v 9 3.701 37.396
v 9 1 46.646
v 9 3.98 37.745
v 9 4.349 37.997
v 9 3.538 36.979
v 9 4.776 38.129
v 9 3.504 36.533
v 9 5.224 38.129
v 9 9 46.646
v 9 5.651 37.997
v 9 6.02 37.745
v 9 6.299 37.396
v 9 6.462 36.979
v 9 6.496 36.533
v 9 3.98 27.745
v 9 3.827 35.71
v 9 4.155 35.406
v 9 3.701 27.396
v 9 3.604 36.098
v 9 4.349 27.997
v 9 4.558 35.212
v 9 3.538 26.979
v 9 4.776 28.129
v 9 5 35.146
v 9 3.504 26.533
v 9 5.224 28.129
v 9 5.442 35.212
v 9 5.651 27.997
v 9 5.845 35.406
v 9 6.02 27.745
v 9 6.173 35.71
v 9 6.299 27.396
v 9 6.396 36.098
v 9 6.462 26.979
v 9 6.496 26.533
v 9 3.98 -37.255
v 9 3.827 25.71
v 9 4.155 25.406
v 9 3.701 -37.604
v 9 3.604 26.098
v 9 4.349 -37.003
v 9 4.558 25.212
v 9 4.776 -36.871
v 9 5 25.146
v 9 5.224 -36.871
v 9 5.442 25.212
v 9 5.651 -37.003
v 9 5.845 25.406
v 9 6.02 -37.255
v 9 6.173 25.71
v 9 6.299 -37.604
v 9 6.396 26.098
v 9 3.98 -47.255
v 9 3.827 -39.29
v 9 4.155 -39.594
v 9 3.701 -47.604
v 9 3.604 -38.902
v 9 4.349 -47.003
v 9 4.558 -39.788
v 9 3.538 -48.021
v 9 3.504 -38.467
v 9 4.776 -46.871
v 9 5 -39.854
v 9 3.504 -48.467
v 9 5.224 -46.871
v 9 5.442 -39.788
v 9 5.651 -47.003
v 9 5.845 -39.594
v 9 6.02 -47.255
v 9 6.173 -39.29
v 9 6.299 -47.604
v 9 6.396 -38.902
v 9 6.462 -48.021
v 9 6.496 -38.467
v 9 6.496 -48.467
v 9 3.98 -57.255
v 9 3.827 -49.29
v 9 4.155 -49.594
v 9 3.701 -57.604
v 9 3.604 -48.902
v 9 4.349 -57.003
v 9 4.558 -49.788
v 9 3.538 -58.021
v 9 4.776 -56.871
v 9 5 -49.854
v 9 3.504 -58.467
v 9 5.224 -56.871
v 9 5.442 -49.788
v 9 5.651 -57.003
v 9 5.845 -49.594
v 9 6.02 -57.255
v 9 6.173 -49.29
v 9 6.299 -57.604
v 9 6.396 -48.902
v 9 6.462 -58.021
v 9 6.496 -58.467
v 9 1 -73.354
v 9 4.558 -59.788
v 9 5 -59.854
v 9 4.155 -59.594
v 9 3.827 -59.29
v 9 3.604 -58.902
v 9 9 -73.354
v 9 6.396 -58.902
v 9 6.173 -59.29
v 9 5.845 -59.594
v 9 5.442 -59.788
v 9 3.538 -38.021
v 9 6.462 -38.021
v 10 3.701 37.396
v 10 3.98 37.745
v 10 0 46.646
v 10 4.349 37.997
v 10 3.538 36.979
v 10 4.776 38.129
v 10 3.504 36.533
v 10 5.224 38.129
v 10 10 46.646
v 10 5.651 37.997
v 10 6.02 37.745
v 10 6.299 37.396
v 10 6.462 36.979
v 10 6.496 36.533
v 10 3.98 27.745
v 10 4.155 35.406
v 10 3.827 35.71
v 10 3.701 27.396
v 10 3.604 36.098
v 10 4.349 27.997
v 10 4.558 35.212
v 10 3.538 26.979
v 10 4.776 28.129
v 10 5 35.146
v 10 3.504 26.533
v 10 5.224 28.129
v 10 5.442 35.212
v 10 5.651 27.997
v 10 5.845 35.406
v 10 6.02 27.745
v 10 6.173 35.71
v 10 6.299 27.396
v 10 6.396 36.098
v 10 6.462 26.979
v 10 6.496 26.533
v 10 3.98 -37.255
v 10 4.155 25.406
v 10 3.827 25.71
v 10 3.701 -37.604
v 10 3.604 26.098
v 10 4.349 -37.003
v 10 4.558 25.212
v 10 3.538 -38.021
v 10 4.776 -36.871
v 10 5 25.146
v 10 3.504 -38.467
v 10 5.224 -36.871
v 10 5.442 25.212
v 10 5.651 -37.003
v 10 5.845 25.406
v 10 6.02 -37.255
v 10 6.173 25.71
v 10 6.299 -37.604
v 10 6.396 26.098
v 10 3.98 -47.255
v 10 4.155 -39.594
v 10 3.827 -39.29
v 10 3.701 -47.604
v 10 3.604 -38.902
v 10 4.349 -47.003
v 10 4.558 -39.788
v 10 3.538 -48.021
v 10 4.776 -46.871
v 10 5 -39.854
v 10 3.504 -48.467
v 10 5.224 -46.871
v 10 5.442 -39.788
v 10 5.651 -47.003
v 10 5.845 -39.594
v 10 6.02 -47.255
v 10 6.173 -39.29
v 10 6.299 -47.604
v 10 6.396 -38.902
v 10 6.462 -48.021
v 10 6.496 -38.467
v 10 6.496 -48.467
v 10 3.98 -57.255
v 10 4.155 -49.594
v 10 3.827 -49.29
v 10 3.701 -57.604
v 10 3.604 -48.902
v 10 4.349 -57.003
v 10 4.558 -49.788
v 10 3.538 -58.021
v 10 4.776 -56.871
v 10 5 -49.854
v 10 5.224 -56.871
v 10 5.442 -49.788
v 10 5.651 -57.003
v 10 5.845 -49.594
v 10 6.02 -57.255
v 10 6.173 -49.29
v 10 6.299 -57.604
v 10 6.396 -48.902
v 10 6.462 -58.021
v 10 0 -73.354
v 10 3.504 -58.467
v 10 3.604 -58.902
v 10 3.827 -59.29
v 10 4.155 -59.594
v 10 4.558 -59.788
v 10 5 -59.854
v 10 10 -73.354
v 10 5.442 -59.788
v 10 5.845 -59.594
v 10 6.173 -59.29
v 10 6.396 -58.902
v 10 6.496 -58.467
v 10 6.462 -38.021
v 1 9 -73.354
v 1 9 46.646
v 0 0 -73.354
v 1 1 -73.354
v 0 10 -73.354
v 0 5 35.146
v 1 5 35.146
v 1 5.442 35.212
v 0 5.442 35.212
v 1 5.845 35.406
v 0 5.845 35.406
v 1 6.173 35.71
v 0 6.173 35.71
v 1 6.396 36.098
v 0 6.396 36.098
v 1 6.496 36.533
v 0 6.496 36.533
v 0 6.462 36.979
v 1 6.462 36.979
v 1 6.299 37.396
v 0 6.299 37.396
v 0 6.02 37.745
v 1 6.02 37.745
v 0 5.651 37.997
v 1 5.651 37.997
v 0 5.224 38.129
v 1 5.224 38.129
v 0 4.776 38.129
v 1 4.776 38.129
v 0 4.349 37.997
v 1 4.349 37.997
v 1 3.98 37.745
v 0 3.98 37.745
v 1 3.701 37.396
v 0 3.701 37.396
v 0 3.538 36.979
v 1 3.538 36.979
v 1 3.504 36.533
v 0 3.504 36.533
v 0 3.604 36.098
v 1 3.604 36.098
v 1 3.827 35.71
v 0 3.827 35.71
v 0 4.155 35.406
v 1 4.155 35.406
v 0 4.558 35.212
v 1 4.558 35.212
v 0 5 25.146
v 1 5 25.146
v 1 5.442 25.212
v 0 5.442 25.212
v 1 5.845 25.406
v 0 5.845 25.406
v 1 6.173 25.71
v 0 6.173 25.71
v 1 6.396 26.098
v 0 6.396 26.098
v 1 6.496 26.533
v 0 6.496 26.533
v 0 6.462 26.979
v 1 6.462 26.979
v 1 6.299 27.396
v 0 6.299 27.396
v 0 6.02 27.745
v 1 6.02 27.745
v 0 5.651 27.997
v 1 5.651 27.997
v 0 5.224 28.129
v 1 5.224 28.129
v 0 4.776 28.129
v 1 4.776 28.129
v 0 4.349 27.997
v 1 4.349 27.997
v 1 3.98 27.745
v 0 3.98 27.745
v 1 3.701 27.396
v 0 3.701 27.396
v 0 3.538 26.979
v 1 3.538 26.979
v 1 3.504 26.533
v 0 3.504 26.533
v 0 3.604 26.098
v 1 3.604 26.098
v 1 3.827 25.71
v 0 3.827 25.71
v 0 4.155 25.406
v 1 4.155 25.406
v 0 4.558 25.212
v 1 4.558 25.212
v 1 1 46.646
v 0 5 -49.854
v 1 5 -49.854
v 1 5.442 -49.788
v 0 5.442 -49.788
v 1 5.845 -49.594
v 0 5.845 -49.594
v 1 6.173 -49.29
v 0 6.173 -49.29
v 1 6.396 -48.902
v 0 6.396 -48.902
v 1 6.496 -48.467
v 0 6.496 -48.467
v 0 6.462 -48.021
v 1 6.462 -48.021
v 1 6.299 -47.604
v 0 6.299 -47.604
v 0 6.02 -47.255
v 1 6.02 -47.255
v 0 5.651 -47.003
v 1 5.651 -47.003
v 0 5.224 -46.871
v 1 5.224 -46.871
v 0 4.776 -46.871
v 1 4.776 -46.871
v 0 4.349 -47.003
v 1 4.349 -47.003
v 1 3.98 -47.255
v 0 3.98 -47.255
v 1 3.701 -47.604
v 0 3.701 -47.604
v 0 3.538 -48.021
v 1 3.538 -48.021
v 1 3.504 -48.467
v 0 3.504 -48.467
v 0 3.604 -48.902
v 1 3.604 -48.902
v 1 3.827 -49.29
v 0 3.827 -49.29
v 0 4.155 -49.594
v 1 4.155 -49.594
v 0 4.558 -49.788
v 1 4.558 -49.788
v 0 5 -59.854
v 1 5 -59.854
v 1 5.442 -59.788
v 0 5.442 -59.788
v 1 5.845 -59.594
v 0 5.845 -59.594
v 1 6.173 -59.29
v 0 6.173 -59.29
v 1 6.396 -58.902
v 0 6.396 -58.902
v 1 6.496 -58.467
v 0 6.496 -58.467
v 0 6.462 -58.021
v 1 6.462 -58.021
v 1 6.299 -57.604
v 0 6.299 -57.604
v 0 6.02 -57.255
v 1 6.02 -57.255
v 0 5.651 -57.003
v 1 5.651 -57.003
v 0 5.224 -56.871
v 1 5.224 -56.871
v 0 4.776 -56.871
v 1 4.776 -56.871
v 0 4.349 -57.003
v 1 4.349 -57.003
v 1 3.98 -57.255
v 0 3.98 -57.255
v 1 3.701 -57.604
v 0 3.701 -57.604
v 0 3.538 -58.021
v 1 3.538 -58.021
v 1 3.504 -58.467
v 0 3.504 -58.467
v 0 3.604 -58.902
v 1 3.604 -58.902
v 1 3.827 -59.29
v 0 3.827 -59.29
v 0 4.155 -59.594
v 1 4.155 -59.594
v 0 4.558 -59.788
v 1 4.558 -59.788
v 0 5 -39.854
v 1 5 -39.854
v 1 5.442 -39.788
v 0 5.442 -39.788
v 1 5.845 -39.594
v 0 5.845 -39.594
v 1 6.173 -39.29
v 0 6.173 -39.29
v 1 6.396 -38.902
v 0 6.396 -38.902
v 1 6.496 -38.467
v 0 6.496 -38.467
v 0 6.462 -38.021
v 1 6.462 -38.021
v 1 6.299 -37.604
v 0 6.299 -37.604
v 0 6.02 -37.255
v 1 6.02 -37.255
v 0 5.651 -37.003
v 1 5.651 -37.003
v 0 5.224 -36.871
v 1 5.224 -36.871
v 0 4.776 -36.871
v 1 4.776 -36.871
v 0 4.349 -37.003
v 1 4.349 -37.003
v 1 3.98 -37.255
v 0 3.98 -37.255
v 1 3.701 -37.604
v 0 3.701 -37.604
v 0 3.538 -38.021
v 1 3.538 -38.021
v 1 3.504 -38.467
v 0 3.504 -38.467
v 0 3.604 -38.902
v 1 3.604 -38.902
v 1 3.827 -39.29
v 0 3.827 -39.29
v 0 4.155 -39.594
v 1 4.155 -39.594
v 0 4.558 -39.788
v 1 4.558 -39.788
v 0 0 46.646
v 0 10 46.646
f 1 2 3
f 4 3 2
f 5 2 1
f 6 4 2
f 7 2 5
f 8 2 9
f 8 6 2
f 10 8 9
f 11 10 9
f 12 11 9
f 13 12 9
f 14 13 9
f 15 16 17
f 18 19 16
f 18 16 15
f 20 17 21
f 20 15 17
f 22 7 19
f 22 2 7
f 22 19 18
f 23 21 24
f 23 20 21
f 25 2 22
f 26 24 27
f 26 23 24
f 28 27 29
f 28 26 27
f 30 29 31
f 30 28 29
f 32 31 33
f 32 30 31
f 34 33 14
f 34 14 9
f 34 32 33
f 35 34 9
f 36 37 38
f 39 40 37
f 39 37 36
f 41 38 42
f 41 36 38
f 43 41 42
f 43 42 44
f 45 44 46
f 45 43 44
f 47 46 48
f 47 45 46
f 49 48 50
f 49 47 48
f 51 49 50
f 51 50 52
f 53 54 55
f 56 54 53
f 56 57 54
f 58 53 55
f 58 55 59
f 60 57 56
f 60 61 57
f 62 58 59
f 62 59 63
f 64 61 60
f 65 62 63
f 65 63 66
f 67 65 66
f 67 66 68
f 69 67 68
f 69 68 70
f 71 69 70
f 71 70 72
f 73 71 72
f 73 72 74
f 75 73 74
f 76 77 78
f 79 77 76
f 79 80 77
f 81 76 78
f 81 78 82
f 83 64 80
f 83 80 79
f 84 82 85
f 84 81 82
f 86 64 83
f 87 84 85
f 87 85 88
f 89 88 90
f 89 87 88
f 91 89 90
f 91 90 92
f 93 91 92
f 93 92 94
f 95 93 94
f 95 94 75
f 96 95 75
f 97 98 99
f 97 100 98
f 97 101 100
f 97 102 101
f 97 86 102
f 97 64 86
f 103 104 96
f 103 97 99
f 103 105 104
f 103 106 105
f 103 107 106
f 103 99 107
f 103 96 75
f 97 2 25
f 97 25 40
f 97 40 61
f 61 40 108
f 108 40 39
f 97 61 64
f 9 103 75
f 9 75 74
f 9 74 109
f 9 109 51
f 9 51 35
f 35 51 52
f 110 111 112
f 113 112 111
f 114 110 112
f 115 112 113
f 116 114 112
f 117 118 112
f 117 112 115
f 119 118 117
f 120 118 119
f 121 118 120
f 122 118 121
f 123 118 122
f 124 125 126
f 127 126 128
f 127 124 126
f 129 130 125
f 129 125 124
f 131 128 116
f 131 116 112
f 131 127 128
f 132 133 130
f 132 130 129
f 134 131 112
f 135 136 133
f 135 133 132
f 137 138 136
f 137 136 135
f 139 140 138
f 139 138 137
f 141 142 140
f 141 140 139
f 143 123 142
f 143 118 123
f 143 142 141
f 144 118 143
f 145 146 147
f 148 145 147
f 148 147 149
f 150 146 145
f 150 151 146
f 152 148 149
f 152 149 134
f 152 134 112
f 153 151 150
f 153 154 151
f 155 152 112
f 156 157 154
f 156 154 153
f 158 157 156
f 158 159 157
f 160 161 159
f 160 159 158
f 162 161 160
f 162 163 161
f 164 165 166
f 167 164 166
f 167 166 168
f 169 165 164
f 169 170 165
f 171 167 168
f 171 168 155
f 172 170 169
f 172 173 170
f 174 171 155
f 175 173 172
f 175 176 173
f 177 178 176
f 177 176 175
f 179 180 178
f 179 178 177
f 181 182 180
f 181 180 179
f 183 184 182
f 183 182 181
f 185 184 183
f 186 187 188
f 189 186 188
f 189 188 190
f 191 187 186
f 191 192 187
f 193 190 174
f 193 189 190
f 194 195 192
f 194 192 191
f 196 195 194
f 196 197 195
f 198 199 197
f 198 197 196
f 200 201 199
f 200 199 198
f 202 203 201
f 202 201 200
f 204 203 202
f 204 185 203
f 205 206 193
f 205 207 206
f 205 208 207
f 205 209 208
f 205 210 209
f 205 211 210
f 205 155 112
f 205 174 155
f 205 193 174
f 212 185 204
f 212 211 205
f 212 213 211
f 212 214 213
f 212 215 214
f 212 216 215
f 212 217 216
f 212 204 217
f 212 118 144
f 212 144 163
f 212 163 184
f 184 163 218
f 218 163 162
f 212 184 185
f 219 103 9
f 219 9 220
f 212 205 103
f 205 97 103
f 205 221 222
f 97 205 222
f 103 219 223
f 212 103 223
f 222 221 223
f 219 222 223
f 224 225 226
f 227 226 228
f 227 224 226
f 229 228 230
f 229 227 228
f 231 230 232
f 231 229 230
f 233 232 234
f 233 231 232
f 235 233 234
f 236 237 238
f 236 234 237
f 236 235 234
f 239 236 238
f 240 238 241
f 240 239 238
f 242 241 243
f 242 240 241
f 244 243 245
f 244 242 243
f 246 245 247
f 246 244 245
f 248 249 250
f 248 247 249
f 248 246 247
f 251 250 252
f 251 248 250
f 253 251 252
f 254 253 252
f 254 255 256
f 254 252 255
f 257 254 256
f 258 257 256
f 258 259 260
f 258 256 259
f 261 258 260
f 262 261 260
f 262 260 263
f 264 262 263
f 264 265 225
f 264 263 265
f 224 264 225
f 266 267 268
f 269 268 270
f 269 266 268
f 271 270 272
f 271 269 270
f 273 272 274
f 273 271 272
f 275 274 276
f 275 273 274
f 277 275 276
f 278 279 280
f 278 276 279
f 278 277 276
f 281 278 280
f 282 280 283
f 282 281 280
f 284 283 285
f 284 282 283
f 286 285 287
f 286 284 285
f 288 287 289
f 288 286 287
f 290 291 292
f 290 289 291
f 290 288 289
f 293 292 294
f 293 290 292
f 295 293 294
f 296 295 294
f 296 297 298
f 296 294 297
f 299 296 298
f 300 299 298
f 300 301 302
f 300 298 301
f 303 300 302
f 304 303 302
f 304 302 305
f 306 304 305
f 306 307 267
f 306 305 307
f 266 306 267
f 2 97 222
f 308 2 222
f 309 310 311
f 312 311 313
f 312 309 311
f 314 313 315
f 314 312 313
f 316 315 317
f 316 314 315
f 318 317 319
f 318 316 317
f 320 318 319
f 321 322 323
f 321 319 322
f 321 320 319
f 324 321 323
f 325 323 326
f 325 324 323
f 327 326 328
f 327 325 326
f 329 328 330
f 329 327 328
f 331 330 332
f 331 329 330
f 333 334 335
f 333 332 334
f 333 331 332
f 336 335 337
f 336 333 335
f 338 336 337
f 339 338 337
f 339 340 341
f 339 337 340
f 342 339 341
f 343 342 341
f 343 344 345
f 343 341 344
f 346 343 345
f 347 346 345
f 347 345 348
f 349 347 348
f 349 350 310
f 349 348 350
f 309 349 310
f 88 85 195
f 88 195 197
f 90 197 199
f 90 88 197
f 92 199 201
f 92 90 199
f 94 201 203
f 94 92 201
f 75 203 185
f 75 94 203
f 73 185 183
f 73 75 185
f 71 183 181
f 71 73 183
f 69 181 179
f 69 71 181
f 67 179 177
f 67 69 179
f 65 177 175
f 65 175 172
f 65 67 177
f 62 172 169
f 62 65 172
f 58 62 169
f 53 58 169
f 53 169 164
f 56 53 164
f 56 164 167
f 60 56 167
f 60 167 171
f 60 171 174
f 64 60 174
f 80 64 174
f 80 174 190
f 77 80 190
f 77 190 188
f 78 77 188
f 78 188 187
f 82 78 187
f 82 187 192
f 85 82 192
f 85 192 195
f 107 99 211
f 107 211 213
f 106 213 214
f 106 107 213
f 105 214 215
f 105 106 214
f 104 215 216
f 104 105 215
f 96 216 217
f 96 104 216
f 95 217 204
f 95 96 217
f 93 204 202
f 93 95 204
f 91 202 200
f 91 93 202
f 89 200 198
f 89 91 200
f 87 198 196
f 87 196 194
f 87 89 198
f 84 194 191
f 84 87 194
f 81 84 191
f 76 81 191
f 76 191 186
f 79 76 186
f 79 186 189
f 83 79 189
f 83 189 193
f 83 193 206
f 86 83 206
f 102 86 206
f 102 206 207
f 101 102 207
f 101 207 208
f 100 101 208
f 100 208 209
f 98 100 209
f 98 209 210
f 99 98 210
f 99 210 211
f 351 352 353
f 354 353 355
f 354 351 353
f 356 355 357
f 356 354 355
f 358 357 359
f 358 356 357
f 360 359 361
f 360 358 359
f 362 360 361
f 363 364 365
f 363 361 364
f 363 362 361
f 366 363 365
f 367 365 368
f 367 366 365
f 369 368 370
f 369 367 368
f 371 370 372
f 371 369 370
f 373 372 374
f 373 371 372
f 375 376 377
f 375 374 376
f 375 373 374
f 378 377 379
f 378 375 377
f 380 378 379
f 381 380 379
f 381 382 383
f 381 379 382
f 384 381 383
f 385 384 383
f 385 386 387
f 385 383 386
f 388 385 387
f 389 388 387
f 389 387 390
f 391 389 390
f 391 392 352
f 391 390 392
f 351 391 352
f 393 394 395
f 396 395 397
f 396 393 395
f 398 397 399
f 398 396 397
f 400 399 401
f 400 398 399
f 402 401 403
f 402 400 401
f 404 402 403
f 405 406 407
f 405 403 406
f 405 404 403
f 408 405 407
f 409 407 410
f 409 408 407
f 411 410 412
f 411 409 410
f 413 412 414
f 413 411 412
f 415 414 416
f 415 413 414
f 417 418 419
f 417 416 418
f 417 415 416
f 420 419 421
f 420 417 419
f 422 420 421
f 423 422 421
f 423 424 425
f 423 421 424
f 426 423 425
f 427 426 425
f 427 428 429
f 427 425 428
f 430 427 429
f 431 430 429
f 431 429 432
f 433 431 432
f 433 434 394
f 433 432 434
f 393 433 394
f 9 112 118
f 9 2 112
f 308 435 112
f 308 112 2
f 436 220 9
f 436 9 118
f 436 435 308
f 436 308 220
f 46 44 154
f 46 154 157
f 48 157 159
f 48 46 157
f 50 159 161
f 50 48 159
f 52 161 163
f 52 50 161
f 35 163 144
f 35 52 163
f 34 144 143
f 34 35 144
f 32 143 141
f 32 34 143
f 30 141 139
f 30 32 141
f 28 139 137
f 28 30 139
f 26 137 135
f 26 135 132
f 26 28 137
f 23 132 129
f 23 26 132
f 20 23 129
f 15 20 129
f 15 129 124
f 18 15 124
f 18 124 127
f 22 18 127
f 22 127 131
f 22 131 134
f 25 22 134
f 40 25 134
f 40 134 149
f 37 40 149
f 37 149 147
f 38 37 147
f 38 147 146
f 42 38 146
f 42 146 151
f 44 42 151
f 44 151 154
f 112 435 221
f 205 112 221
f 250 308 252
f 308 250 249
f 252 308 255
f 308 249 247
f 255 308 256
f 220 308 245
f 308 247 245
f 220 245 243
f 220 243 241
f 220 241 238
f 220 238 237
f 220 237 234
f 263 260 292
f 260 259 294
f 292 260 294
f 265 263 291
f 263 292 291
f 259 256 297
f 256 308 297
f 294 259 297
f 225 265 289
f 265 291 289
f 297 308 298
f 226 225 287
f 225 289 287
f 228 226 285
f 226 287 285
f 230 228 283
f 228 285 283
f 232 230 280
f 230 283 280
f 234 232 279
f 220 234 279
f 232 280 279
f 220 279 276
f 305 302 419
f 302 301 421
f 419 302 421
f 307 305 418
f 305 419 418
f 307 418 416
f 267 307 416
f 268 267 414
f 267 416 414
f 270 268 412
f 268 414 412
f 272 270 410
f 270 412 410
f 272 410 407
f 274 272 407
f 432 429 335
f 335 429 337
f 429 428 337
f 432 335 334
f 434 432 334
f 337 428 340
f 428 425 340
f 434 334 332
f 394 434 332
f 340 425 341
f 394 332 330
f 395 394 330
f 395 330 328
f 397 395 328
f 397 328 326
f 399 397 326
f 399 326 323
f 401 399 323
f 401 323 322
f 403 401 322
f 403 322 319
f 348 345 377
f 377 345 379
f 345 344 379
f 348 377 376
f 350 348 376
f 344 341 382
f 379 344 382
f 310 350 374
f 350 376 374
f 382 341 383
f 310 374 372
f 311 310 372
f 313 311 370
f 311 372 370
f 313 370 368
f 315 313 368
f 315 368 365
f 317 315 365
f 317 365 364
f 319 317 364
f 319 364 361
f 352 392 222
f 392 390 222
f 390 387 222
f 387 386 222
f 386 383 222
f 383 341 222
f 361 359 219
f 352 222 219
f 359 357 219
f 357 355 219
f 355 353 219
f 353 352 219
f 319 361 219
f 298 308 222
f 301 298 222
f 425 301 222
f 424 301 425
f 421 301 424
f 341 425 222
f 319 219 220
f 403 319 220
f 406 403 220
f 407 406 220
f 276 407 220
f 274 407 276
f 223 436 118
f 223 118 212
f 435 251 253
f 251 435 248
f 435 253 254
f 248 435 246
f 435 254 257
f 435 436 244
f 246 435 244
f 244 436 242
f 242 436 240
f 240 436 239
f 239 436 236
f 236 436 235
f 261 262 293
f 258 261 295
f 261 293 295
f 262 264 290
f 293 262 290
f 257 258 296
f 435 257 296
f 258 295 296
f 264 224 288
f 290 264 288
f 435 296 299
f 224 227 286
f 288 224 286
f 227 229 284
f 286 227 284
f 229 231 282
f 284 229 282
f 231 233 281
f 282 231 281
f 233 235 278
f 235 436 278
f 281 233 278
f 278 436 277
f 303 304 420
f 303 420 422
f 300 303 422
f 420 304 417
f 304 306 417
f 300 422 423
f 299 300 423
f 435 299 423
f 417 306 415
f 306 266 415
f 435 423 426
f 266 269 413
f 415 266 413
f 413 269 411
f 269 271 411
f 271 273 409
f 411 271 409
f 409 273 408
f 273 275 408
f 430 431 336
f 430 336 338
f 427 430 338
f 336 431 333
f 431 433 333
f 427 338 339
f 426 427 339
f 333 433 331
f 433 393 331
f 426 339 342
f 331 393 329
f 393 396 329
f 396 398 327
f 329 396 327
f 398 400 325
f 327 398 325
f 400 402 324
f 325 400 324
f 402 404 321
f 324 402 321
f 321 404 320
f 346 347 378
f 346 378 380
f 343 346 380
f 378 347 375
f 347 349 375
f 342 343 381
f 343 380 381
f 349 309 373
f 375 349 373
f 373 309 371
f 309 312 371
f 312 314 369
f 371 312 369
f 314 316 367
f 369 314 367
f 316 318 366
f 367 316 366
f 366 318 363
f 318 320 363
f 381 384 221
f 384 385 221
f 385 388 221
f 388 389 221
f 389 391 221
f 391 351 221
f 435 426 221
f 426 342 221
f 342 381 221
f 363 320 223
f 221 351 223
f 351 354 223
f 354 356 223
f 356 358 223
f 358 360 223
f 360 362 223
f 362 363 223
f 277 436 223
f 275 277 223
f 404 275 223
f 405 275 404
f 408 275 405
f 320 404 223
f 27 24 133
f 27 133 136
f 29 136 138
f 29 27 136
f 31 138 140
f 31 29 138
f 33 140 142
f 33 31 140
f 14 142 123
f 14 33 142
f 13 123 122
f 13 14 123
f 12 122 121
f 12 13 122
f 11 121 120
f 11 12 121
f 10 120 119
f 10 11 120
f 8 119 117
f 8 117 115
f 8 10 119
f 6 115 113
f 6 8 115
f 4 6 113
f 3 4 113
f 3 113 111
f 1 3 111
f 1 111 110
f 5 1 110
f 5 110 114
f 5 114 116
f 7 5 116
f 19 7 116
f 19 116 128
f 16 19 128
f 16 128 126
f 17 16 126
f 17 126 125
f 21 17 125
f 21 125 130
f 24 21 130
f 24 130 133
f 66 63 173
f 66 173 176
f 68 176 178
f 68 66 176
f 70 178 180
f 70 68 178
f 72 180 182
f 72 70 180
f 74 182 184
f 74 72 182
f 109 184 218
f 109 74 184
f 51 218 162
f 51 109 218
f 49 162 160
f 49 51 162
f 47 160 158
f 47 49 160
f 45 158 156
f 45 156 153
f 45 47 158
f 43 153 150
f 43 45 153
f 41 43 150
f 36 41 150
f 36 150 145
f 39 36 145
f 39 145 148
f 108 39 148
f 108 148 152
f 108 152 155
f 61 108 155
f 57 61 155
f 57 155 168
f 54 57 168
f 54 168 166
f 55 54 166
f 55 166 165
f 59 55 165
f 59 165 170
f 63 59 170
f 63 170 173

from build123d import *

# Parameters (mm, degrees)
SKETCH_1_W          = 120
SKETCH_1_H          = 10
SKETCH_1_R          = 1.5
EXTRUDE_1_DEPTH     = 10
SKETCH_2_W          = 8
SKETCH_2_H          = 8
CUT_EXTRUDE_1_DEPTH = 120


with BuildPart() as part:
    # 草图1 → 凸台-拉伸1 (new body)
    with BuildSketch(Plane(origin=(0, 0, 0), x_dir=(0, 0, -1), z_dir=(1, 0, 0))):
        with Locations((13.354414341, 5)):
            Rectangle(SKETCH_1_W, SKETCH_1_H)
        with Locations((-36.645585659, 5)):
            Circle(SKETCH_1_R, mode=Mode.SUBTRACT)
        with Locations((-26.645585659, 5)):
            Circle(SKETCH_1_R, mode=Mode.SUBTRACT)
        with Locations((58.354414341, 5)):
            Circle(SKETCH_1_R, mode=Mode.SUBTRACT)
        with Locations((48.354414341, 5)):
            Circle(SKETCH_1_R, mode=Mode.SUBTRACT)
        with Locations((38.354414341, 5)):
            Circle(SKETCH_1_R, mode=Mode.SUBTRACT)
    extrude(amount=EXTRUDE_1_DEPTH)

    # 草图2 → 切除-拉伸1 (cut)
    with BuildSketch(Plane(origin=(0, 0, -73.354414341), x_dir=(-1, 0, 0), z_dir=(0, 0, -1))):
        with Locations((-5, 5)):
            Rectangle(SKETCH_2_W, SKETCH_2_H)
    extrude(amount=-CUT_EXTRUDE_1_DEPTH, mode=Mode.SUBTRACT)


solid = part.part
